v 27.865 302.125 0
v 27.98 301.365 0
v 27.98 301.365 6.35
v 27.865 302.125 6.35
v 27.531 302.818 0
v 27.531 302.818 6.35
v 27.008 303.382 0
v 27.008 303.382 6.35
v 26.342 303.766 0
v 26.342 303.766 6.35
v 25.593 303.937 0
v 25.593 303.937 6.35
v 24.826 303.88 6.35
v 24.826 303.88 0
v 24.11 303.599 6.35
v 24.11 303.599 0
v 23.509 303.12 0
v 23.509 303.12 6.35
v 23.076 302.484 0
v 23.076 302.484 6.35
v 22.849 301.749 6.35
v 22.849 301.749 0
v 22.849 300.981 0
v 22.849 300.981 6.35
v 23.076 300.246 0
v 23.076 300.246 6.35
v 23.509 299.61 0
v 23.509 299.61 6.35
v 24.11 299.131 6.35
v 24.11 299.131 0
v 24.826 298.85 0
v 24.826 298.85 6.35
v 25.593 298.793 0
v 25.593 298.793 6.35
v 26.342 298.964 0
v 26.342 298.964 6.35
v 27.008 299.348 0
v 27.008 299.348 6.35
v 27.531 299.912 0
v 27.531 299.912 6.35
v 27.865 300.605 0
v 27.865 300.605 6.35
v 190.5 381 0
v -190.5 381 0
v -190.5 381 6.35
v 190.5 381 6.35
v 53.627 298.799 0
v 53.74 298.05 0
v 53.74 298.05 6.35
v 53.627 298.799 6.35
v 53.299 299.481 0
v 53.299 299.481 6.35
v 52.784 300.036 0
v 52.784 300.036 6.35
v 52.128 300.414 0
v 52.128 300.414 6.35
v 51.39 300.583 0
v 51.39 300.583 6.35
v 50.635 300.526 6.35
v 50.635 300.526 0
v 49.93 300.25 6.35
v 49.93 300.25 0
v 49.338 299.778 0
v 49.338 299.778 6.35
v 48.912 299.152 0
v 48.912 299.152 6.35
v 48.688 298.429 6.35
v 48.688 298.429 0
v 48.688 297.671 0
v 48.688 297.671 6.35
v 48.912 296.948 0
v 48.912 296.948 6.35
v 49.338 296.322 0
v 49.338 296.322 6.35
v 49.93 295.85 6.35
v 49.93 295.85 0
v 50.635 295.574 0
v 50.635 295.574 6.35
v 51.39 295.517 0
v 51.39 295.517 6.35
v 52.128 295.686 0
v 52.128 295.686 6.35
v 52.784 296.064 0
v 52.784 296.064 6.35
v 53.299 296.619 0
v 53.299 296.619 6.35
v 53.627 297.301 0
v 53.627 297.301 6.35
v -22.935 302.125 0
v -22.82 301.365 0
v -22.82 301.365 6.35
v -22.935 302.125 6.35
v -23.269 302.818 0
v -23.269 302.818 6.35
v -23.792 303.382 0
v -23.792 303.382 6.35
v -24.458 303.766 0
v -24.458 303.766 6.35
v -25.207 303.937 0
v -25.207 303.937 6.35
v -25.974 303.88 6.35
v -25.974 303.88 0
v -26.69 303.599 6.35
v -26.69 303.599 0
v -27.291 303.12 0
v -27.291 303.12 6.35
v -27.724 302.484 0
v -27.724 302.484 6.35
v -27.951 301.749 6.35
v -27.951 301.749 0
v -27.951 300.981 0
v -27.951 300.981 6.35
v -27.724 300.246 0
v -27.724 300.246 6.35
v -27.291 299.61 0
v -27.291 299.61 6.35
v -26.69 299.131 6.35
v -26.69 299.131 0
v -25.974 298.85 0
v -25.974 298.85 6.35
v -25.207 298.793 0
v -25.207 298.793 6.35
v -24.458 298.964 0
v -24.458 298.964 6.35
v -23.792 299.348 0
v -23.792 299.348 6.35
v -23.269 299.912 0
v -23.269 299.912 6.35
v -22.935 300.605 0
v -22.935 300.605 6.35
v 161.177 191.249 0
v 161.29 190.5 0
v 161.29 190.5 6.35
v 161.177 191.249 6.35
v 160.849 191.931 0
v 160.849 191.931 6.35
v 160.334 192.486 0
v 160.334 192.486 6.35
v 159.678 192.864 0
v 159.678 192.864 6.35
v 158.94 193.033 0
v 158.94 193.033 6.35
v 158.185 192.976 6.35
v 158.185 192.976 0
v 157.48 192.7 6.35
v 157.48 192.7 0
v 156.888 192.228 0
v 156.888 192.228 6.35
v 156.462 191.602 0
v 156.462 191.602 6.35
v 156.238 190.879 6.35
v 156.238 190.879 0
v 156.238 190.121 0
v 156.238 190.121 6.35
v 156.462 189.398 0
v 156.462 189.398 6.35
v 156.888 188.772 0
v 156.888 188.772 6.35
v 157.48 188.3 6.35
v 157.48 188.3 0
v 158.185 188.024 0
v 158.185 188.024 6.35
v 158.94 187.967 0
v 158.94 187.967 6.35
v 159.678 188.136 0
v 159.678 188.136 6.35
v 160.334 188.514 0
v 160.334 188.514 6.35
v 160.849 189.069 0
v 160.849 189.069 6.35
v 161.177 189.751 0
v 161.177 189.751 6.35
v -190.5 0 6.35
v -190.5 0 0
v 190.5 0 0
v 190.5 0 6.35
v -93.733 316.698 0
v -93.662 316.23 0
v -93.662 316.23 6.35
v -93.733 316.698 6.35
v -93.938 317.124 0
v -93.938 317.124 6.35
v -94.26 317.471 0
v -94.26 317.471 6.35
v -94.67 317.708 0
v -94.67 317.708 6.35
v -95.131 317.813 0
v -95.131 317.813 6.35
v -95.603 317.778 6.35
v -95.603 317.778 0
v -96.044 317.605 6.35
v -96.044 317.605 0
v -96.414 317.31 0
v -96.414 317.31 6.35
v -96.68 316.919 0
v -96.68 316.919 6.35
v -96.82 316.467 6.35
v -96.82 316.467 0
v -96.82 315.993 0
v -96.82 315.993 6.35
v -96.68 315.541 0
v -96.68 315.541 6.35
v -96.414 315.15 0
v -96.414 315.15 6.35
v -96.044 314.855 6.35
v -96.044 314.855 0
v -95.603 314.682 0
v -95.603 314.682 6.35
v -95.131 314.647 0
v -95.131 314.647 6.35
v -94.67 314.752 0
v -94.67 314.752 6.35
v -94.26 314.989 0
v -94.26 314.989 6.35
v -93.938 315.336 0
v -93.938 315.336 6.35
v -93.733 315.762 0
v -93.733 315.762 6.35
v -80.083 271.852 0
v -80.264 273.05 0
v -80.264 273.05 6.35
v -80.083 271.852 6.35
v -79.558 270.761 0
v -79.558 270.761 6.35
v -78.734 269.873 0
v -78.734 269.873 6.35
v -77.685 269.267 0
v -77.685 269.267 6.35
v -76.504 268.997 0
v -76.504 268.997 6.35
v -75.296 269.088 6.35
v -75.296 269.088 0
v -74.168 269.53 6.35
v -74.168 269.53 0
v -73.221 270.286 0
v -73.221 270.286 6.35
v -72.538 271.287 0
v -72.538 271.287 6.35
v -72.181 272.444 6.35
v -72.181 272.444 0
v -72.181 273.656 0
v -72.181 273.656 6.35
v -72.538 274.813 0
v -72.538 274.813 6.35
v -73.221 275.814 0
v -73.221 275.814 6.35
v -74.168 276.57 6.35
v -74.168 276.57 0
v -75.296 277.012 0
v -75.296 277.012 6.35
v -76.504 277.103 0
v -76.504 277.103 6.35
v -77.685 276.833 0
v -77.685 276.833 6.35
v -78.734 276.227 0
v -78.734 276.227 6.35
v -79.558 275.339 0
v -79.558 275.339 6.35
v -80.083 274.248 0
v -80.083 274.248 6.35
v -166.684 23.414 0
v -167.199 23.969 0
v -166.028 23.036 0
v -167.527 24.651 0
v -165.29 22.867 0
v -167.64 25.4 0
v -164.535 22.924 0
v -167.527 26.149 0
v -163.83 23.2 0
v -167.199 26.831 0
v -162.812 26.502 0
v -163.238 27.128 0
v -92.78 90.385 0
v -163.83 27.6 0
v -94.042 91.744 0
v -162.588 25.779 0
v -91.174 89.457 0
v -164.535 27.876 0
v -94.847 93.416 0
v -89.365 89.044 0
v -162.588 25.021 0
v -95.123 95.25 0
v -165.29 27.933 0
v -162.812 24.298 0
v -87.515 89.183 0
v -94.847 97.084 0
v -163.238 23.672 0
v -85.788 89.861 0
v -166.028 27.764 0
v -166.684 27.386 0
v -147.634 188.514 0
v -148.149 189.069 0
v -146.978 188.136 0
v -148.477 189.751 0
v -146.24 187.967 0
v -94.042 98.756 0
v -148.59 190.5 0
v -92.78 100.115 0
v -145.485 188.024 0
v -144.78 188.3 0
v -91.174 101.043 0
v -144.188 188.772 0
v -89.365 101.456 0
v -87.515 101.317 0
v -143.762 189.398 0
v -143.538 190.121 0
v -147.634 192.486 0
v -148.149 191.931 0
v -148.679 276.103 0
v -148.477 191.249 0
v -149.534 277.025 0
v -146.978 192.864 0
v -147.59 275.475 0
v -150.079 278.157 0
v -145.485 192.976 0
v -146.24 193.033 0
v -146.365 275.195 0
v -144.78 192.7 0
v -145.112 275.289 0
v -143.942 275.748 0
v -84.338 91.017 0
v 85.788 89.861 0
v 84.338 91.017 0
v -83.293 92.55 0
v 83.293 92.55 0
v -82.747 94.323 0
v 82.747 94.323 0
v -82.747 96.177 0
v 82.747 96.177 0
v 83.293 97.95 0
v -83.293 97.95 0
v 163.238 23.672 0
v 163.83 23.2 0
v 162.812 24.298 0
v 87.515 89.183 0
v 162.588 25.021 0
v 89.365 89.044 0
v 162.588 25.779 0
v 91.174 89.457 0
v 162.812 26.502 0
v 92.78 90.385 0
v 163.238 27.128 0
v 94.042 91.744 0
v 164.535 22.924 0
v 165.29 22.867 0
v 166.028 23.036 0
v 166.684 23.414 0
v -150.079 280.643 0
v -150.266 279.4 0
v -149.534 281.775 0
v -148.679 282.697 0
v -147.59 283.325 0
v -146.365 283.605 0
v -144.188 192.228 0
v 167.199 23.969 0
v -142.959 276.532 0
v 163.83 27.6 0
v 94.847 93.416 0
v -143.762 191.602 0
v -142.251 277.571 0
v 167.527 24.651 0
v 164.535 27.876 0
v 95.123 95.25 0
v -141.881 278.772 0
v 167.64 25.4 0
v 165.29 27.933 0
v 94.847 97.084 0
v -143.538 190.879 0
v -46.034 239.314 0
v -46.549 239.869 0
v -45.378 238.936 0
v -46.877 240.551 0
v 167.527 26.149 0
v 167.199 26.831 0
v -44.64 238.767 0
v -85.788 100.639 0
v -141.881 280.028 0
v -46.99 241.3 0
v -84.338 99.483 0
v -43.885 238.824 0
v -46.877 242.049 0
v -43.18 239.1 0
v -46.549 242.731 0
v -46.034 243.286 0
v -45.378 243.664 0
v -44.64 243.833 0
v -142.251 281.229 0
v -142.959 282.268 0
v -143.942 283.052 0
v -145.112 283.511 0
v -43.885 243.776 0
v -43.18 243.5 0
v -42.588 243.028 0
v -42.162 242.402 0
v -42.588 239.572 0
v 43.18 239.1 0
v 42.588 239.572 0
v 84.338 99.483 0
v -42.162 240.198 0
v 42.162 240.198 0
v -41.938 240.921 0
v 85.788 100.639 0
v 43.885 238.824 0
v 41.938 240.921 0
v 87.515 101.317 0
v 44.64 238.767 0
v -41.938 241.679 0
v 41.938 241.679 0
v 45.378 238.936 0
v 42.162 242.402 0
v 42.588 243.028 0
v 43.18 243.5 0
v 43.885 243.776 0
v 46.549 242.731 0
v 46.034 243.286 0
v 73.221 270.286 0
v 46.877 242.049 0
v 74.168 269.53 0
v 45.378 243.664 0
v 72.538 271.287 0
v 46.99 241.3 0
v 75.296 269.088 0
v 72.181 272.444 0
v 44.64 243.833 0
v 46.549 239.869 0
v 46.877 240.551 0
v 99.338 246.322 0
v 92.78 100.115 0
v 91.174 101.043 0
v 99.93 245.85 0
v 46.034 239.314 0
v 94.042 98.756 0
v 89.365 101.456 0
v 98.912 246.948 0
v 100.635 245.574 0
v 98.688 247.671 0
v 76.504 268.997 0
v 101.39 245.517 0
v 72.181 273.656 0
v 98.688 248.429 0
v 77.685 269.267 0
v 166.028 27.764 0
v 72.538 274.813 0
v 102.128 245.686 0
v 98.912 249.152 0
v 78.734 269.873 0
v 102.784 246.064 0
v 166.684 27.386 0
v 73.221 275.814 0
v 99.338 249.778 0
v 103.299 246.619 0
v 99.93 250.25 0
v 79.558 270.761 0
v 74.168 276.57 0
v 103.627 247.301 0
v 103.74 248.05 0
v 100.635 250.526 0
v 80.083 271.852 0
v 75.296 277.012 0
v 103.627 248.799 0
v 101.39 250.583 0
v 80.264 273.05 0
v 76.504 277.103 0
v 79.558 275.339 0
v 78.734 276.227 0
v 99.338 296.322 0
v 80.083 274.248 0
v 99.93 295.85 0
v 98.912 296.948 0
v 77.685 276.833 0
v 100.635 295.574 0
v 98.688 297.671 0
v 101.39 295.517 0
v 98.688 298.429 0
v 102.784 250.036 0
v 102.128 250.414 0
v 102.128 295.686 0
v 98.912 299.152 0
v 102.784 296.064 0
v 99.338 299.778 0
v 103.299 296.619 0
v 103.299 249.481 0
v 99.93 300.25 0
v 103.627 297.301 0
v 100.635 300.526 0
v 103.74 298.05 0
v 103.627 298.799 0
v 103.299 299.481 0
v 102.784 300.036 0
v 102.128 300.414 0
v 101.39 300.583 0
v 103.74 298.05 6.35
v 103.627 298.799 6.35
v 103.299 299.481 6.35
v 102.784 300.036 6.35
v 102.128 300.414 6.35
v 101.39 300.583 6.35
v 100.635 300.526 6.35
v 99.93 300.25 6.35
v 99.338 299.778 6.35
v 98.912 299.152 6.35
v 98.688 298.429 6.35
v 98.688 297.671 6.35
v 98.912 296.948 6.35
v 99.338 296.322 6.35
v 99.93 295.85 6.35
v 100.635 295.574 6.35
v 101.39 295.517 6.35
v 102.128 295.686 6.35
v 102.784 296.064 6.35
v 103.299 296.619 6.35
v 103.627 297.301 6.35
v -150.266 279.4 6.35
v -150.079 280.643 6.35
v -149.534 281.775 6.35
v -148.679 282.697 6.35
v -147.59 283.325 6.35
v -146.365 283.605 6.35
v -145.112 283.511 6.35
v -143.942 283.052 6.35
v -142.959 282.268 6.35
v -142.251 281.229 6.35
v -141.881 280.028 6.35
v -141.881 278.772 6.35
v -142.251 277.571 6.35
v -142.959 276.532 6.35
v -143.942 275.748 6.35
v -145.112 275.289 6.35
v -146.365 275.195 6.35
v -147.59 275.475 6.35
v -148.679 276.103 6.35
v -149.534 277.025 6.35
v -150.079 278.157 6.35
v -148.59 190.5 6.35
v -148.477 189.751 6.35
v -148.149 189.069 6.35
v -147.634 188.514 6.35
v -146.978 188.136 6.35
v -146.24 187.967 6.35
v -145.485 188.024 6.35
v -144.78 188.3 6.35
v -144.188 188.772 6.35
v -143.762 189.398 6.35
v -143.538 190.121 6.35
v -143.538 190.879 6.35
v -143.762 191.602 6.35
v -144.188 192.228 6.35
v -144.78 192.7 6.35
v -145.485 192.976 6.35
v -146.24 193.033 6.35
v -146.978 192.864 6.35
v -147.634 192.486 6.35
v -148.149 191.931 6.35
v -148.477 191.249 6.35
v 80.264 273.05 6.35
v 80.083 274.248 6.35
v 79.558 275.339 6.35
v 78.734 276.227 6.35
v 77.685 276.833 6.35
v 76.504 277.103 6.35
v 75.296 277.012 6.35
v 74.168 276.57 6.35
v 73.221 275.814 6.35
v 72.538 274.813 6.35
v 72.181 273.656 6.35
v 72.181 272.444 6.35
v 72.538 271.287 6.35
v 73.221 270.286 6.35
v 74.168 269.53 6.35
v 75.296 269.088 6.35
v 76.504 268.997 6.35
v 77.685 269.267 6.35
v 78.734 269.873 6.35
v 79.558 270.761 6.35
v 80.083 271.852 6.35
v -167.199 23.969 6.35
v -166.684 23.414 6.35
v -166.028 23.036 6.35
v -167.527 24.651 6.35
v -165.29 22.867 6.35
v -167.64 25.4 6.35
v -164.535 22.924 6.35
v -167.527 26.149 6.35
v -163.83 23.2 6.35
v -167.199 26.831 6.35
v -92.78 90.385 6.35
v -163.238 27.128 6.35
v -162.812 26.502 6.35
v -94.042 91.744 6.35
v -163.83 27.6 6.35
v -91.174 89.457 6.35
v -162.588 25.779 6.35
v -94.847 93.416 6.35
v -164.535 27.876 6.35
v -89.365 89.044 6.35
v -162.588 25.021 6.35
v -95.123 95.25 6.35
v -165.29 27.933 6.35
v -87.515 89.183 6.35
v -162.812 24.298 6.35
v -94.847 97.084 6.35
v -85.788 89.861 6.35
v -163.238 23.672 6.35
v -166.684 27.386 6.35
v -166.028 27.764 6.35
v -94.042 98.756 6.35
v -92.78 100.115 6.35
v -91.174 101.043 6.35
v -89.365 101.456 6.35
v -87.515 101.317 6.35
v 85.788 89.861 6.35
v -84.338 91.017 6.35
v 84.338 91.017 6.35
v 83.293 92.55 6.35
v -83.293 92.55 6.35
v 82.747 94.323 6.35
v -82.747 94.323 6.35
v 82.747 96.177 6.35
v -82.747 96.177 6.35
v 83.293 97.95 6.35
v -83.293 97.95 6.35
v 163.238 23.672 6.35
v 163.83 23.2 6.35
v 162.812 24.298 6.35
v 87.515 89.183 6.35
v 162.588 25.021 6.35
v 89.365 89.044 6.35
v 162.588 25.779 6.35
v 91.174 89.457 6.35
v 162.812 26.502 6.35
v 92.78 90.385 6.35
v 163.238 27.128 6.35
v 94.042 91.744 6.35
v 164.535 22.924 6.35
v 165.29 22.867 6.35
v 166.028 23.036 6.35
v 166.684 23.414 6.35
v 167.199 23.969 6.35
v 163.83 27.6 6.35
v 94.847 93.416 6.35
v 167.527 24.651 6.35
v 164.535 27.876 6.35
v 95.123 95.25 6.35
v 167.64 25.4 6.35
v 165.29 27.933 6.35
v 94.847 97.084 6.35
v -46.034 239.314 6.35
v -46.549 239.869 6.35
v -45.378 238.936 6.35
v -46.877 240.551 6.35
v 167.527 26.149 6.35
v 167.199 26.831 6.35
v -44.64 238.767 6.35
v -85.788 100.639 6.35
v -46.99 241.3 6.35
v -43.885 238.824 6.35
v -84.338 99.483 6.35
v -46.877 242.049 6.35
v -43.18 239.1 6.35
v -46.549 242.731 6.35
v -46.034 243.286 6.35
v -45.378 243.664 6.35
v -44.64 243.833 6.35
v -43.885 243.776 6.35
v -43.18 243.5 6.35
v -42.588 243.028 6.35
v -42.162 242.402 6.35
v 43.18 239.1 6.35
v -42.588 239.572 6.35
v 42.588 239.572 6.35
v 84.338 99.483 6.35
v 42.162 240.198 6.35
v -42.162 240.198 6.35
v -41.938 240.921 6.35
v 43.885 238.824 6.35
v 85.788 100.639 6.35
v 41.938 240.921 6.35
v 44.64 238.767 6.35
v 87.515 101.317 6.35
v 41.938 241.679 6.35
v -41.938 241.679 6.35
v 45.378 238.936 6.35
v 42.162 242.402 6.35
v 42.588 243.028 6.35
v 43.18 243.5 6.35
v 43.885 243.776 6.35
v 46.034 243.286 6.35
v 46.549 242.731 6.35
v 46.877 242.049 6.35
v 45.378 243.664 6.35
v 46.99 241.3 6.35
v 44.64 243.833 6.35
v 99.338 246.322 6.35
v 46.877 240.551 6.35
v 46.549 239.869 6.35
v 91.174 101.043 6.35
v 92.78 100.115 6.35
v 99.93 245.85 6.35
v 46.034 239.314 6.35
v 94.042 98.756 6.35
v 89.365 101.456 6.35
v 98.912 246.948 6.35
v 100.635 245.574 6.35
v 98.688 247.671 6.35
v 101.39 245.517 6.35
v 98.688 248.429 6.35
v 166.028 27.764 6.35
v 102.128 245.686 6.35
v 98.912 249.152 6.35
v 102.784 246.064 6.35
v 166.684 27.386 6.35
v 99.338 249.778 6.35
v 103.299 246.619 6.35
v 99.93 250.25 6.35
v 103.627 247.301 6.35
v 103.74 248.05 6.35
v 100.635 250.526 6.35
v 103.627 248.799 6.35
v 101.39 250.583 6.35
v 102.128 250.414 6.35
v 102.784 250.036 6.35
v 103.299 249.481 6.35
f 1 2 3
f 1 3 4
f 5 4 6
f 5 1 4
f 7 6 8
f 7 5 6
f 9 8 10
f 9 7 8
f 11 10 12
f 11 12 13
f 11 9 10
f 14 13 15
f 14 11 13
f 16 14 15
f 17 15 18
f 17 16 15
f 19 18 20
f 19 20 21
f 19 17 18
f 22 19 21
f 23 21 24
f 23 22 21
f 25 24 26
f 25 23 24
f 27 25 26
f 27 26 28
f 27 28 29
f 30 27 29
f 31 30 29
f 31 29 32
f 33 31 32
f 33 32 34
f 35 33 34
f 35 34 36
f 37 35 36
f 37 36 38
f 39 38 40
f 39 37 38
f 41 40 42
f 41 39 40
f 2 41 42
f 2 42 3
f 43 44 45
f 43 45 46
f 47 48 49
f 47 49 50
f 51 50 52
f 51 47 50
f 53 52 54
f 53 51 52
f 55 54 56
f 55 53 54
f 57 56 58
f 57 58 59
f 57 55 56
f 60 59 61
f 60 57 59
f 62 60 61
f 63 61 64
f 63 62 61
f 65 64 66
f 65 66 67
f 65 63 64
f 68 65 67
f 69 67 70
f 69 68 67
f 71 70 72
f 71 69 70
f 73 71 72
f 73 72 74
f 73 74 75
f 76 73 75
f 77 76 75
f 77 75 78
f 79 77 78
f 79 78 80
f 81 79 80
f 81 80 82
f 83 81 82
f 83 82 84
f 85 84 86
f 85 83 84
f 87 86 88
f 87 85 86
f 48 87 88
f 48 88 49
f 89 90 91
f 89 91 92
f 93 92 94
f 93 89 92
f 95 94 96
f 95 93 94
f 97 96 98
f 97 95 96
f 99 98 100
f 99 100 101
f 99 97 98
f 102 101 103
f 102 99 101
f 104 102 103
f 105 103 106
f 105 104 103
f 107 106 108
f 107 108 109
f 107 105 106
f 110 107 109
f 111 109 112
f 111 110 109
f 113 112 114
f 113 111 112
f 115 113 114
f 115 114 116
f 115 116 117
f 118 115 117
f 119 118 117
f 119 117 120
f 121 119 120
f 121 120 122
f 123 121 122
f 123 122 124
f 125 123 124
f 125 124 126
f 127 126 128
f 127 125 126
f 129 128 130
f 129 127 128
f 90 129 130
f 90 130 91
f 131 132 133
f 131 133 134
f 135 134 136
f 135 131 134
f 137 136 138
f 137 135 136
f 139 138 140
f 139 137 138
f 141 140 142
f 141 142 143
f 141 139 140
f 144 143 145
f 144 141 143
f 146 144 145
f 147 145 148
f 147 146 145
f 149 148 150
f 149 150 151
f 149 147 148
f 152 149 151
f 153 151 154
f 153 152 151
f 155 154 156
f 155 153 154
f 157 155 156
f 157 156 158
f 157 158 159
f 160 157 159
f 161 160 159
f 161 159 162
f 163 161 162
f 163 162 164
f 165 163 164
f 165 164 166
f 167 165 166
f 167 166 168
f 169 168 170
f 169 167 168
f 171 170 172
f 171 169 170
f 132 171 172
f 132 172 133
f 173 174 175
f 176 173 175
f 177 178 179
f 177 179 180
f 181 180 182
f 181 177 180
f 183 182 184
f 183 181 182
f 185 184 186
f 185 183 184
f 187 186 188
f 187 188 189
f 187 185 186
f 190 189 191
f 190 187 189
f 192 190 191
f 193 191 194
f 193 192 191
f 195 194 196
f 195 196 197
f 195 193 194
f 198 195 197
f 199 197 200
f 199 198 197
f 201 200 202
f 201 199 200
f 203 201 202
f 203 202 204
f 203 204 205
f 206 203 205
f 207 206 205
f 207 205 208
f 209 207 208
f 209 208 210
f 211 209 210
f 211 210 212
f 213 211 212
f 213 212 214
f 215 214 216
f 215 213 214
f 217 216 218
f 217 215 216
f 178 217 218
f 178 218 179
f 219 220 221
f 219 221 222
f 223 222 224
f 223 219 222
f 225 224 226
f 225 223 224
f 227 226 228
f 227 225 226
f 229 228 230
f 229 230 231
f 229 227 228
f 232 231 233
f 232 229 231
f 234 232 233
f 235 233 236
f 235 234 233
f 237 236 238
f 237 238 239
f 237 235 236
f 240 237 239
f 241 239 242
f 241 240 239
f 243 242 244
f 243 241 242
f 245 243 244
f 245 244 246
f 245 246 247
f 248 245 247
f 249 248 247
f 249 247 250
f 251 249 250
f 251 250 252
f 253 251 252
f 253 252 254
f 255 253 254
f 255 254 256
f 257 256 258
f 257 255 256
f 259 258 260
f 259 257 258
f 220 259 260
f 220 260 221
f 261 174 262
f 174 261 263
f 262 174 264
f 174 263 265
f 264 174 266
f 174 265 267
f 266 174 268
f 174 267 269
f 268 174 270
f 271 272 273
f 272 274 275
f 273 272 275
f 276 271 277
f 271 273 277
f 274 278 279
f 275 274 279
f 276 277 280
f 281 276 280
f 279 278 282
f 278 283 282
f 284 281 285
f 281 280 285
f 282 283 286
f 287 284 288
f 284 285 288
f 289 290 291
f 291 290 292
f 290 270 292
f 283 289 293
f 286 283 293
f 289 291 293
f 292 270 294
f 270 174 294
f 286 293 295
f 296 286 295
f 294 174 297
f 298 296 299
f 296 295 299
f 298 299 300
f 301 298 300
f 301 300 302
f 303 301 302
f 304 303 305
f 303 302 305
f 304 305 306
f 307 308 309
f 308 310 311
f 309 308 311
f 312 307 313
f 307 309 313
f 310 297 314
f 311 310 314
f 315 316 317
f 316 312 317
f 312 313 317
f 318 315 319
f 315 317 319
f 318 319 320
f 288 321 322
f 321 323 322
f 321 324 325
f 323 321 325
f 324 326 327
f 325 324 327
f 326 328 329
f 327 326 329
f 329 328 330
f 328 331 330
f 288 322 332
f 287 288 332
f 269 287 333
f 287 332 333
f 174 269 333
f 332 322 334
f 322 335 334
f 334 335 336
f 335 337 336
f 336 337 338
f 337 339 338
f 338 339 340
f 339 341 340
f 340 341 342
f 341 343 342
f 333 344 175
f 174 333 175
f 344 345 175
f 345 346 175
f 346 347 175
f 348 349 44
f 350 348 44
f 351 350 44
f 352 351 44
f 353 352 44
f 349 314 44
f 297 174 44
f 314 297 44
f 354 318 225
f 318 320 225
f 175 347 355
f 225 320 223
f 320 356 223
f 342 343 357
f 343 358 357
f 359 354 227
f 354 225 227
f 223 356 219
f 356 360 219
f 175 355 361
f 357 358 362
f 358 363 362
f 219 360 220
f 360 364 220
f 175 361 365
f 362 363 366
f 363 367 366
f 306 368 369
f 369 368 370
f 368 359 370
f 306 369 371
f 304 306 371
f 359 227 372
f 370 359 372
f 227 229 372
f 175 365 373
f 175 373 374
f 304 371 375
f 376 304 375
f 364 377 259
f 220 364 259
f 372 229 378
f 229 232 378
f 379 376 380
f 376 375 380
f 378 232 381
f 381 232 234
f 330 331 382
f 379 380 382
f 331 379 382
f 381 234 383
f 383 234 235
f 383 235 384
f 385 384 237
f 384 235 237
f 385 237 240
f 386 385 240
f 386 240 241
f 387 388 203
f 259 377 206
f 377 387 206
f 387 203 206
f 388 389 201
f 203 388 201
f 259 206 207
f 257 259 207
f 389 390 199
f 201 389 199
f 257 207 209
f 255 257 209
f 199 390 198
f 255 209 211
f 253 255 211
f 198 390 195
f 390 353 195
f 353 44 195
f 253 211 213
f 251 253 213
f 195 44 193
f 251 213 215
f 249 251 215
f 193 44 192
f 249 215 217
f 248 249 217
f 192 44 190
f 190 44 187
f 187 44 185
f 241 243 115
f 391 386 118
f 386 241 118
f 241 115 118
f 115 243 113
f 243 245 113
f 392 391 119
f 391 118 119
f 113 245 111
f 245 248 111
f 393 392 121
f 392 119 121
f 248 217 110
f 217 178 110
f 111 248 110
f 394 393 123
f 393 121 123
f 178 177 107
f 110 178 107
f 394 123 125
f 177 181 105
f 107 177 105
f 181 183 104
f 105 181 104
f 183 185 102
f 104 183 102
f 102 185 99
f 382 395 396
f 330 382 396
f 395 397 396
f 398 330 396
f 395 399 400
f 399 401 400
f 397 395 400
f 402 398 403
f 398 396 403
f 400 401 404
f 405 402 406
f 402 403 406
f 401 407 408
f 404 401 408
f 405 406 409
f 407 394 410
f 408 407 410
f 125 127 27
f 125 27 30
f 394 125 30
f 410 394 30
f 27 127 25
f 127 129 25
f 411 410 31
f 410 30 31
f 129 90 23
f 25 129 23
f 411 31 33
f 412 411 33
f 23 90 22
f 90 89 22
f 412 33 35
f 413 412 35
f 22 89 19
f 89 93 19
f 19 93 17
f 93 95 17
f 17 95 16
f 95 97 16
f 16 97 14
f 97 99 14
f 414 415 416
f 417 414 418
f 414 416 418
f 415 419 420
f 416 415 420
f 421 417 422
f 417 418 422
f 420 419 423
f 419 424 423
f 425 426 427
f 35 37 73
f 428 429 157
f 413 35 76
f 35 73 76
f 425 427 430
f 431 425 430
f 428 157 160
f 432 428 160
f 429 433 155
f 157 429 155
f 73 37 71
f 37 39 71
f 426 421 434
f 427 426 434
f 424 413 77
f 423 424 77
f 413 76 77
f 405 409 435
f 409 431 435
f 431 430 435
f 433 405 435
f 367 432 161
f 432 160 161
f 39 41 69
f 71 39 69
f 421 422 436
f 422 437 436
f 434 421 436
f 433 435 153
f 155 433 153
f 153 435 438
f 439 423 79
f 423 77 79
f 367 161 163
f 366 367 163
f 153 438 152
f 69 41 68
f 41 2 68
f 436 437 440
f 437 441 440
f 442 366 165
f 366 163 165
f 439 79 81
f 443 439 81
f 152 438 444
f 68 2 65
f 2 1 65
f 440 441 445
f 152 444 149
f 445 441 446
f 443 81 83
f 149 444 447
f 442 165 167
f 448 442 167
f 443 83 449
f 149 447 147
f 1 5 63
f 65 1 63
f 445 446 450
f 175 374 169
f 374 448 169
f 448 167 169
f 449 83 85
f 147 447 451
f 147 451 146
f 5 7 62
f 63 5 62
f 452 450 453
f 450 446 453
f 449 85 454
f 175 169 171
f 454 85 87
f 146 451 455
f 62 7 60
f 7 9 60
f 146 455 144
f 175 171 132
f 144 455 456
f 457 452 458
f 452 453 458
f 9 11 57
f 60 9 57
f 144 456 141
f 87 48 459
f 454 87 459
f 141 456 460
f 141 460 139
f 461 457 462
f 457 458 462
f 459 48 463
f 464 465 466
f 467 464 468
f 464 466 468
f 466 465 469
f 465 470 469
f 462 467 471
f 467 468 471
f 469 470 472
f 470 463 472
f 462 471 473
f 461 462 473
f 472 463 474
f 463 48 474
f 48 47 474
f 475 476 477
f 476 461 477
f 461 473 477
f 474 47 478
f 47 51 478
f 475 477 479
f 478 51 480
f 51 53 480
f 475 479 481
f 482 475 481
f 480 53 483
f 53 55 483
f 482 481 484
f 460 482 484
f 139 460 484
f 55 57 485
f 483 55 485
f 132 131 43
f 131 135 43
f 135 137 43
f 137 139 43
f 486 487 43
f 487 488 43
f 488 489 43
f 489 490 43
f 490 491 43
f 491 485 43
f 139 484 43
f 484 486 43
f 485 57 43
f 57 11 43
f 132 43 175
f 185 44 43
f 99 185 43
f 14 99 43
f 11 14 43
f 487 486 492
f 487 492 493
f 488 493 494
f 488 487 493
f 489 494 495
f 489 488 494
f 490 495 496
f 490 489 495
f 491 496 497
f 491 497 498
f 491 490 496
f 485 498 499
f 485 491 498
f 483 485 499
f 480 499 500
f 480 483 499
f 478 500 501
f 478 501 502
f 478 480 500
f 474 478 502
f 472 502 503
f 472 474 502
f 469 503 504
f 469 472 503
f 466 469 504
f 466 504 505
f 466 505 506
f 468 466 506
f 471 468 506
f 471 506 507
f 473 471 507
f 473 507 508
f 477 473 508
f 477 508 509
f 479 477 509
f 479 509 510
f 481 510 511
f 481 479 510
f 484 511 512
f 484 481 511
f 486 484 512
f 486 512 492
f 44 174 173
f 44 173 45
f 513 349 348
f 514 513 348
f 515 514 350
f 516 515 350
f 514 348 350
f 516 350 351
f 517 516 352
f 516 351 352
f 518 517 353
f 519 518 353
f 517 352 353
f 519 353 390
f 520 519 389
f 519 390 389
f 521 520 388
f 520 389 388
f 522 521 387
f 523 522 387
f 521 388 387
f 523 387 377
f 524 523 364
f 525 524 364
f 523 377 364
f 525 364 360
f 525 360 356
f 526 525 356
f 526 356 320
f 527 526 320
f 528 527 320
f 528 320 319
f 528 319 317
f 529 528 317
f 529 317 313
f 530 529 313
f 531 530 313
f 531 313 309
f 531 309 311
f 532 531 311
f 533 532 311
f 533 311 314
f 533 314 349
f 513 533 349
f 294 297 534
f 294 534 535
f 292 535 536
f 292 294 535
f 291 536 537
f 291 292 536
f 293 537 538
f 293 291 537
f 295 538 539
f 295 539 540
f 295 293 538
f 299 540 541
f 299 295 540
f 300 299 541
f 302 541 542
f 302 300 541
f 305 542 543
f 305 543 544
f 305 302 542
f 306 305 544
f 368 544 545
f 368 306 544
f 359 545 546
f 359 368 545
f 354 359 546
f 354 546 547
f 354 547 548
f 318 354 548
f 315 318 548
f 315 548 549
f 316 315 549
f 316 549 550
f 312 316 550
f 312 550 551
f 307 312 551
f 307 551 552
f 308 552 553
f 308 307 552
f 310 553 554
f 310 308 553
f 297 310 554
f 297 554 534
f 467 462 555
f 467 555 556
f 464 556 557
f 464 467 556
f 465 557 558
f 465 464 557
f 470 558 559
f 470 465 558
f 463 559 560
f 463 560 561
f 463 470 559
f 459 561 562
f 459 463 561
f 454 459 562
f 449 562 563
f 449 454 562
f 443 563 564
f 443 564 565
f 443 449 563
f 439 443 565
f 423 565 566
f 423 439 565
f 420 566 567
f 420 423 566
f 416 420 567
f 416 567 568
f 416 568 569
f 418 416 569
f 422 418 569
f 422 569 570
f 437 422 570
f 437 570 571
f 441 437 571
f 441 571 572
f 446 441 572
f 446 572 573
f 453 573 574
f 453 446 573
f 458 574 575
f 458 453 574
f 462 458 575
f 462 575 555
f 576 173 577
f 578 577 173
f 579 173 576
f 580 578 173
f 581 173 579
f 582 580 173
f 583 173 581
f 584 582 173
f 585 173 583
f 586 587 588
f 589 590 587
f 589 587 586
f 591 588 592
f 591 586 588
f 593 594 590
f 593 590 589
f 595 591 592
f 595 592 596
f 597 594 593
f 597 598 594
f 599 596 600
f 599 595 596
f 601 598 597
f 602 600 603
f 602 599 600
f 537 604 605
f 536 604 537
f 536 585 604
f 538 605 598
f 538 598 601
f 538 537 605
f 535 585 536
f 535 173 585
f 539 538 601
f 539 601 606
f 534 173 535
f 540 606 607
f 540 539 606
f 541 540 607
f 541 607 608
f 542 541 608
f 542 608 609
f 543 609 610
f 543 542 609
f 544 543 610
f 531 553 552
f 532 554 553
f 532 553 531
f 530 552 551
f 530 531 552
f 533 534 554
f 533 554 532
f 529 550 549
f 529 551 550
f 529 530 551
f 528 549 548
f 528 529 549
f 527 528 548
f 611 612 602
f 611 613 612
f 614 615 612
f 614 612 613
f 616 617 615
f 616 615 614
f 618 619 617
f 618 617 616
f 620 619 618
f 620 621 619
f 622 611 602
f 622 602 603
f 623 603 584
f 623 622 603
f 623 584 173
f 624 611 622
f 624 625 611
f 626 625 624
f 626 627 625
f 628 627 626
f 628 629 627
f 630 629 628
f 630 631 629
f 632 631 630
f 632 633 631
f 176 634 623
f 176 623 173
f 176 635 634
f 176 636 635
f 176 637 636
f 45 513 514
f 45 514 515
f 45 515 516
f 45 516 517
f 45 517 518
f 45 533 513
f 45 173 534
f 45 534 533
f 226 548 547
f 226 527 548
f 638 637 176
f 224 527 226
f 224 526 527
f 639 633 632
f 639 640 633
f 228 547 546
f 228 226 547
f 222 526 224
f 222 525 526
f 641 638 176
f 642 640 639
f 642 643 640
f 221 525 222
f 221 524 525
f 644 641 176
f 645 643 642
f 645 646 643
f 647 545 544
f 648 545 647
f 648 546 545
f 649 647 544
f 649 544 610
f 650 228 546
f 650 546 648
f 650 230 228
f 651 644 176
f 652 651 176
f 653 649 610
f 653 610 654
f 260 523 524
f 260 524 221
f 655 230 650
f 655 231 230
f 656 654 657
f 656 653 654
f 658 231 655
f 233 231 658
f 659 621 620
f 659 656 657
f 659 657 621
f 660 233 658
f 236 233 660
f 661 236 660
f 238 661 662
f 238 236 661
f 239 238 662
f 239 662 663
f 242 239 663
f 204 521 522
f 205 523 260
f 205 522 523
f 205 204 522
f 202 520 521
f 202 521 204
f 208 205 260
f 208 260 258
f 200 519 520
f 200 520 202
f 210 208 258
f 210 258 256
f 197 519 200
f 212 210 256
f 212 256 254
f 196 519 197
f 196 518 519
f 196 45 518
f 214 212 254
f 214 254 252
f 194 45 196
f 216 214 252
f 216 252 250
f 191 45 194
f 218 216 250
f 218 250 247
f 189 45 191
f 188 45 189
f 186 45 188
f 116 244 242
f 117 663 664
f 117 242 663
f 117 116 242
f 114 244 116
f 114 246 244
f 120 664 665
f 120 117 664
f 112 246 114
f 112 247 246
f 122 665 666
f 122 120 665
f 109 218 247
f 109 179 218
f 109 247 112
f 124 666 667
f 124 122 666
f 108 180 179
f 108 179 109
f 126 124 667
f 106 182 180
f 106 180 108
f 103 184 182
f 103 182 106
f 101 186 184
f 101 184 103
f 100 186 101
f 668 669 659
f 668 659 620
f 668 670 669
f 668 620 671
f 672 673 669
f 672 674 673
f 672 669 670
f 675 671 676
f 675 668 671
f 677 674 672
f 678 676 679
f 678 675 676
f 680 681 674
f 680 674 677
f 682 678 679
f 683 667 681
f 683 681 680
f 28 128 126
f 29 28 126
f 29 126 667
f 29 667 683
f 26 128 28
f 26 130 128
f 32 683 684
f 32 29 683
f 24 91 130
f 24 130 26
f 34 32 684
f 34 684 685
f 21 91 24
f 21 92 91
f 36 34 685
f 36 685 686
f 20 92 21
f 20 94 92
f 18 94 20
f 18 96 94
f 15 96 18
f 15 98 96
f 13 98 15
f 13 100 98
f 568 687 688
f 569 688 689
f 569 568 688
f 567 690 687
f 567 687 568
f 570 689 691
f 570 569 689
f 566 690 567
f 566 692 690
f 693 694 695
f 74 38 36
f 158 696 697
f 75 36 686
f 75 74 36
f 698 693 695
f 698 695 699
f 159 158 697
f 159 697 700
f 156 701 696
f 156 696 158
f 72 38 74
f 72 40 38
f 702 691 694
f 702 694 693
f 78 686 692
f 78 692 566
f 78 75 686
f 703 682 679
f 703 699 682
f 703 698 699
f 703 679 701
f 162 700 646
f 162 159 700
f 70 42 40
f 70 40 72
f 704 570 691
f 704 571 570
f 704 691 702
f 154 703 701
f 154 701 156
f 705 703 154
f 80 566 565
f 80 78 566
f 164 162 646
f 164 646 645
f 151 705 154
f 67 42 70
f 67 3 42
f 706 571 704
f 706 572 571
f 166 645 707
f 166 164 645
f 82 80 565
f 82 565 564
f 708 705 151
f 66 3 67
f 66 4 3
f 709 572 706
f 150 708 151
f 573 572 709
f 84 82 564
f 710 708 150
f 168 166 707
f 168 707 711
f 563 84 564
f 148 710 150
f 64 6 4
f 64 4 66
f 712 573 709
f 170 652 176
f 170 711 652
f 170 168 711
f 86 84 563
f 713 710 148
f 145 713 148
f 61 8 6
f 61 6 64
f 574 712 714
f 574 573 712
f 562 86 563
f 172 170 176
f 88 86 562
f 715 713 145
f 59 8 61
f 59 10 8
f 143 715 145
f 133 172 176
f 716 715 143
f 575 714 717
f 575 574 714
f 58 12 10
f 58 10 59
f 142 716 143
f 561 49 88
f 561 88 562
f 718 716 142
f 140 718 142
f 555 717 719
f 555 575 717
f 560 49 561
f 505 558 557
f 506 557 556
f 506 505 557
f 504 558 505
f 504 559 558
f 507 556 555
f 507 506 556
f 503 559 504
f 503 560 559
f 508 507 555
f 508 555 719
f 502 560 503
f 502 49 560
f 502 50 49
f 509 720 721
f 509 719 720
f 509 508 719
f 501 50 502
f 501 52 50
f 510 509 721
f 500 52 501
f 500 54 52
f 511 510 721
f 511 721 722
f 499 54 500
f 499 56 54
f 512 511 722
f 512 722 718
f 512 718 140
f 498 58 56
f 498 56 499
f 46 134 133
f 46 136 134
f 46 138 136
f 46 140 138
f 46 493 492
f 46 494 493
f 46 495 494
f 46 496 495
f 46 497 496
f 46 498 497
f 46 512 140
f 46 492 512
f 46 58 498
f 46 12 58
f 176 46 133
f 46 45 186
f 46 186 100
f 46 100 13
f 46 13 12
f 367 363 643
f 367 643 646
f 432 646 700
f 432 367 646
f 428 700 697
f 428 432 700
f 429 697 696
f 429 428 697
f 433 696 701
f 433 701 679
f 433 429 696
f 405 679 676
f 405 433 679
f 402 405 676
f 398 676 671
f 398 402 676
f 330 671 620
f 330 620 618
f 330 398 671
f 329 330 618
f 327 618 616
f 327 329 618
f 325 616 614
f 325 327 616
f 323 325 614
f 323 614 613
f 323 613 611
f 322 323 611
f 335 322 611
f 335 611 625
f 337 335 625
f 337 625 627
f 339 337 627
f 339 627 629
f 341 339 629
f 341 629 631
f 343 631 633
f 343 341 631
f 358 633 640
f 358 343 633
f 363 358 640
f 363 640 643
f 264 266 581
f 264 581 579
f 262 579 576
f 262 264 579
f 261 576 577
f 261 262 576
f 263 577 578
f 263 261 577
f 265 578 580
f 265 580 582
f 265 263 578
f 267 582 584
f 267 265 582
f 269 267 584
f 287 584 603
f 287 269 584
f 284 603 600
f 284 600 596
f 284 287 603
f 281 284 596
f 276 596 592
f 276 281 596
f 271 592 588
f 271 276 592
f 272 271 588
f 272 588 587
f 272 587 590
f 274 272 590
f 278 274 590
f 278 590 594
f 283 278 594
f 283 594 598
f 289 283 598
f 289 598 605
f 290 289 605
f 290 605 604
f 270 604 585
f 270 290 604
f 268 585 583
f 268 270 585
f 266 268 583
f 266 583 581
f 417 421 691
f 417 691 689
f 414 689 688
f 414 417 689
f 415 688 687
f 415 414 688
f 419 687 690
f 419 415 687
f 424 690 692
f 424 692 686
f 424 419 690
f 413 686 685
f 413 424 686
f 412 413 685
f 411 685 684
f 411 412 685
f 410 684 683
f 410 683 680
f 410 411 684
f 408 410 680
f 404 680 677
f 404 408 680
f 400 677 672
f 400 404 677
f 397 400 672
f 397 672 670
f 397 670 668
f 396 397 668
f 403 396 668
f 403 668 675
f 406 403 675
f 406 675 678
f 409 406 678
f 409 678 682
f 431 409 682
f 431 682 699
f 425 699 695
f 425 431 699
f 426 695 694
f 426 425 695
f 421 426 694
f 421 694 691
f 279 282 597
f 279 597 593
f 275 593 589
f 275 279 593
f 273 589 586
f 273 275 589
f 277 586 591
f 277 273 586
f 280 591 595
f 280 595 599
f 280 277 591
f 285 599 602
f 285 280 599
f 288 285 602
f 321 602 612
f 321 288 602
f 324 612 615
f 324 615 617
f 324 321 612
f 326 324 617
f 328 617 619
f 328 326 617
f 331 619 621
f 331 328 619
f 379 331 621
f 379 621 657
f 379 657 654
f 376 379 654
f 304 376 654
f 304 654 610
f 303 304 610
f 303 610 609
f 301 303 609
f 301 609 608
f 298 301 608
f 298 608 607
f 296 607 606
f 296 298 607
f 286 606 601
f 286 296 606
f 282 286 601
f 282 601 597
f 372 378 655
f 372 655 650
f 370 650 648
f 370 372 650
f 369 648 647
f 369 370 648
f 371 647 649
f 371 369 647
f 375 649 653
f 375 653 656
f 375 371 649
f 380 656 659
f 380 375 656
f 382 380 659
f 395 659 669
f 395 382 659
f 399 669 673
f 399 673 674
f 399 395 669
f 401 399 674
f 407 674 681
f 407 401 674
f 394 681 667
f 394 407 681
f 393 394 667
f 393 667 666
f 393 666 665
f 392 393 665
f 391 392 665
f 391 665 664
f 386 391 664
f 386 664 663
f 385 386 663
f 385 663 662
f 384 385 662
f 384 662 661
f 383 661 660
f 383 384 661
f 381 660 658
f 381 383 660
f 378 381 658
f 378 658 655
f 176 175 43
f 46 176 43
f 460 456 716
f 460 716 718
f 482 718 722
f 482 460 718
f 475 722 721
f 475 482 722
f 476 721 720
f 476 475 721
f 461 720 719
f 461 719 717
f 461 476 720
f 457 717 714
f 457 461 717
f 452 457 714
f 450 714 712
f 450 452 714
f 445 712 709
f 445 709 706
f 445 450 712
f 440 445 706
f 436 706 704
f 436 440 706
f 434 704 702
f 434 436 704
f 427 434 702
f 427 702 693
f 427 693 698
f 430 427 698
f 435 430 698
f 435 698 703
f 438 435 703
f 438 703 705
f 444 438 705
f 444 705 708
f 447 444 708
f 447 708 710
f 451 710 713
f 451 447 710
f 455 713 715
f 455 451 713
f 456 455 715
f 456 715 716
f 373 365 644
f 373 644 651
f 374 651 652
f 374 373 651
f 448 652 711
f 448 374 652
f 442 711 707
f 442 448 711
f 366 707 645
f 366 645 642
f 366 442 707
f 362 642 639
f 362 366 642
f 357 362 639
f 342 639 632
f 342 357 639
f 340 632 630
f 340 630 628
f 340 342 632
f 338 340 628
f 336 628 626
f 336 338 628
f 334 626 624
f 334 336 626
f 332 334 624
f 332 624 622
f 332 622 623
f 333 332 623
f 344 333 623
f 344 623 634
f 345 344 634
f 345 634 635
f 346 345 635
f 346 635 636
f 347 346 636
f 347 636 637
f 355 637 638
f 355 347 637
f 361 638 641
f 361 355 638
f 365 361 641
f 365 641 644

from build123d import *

# Parameters (mm, degrees)
SKETCH1_W               = 381
SKETCH1_H               = 381
SKETCH1_R               = 4.064
SKETCH1_R_2             = 2.54
SKETCH1_R_3             = 6.223
SKETCH1_R_4             = 2.5796875
SKETCH1_R_5             = 1.5875
BOSS_EXTRUDE1_DEPTH     = 6.35
F_3_8_24_TAPPED_HOLE2_D = 8.4328


with BuildPart() as part:
    # Sketch1 → Boss-Extrude1 (new body)
    with BuildSketch(Plane.XY):
        with Locations((0, 190.5)):
            Rectangle(SKETCH1_W, SKETCH1_H)
        with Locations((76.2, 273.05)):
            Circle(SKETCH1_R, mode=Mode.SUBTRACT)
        with Locations((44.45, 241.3)):
            Circle(SKETCH1_R_2, mode=Mode.SUBTRACT)
        with Locations((88.9, 95.25)):
            Circle(SKETCH1_R_3, mode=Mode.SUBTRACT)
        with Locations(Location((-165.1, 25.4, 0), (0, 0, 180))):
            Circle(SKETCH1_R_2, mode=Mode.SUBTRACT)
        with Locations((101.2, 298.05)):
            Circle(SKETCH1_R_2, mode=Mode.SUBTRACT)
        with Locations((158.75, 190.5)):
            Circle(SKETCH1_R_2, mode=Mode.SUBTRACT)
        with Locations((101.2, 248.05)):
            Circle(SKETCH1_R_2, mode=Mode.SUBTRACT)
        with Locations((165.1, 25.4)):
            Circle(SKETCH1_R_2, mode=Mode.SUBTRACT)
        with Locations(Location((-88.9, 95.25, 0), (0, 0, 180))):
            Circle(SKETCH1_R_3, mode=Mode.SUBTRACT)
        with Locations(Location((-146.05, 190.5, 0), (0, 0, 180))):
            Circle(SKETCH1_R_2, mode=Mode.SUBTRACT)
        with Locations((51.2, 298.05)):
            Circle(SKETCH1_R_2, mode=Mode.SUBTRACT)
        with Locations((-25.4, 301.365)):
            Circle(SKETCH1_R_4, mode=Mode.SUBTRACT)
        with Locations((25.4, 301.365)):
            Circle(SKETCH1_R_4, mode=Mode.SUBTRACT)
        with Locations(Location((-44.45, 241.3, 0), (0, 0, 180))):
            Circle(SKETCH1_R_2, mode=Mode.SUBTRACT)
        with Locations(Location((-76.2, 273.05, 0), (0, 0, 180))):
            Circle(SKETCH1_R, mode=Mode.SUBTRACT)
        with Locations((-95.25, 316.23)):
            Circle(SKETCH1_R_5, mode=Mode.SUBTRACT)
    extrude(amount=BOSS_EXTRUDE1_DEPTH)

    # 3/8-24 Tapped Hole2 (through all)
    with Locations(Plane.XY.offset(6.35)):
        with Locations((-146.05, 279.4)):
            Hole(F_3_8_24_TAPPED_HOLE2_D / 2)


solid = part.part
